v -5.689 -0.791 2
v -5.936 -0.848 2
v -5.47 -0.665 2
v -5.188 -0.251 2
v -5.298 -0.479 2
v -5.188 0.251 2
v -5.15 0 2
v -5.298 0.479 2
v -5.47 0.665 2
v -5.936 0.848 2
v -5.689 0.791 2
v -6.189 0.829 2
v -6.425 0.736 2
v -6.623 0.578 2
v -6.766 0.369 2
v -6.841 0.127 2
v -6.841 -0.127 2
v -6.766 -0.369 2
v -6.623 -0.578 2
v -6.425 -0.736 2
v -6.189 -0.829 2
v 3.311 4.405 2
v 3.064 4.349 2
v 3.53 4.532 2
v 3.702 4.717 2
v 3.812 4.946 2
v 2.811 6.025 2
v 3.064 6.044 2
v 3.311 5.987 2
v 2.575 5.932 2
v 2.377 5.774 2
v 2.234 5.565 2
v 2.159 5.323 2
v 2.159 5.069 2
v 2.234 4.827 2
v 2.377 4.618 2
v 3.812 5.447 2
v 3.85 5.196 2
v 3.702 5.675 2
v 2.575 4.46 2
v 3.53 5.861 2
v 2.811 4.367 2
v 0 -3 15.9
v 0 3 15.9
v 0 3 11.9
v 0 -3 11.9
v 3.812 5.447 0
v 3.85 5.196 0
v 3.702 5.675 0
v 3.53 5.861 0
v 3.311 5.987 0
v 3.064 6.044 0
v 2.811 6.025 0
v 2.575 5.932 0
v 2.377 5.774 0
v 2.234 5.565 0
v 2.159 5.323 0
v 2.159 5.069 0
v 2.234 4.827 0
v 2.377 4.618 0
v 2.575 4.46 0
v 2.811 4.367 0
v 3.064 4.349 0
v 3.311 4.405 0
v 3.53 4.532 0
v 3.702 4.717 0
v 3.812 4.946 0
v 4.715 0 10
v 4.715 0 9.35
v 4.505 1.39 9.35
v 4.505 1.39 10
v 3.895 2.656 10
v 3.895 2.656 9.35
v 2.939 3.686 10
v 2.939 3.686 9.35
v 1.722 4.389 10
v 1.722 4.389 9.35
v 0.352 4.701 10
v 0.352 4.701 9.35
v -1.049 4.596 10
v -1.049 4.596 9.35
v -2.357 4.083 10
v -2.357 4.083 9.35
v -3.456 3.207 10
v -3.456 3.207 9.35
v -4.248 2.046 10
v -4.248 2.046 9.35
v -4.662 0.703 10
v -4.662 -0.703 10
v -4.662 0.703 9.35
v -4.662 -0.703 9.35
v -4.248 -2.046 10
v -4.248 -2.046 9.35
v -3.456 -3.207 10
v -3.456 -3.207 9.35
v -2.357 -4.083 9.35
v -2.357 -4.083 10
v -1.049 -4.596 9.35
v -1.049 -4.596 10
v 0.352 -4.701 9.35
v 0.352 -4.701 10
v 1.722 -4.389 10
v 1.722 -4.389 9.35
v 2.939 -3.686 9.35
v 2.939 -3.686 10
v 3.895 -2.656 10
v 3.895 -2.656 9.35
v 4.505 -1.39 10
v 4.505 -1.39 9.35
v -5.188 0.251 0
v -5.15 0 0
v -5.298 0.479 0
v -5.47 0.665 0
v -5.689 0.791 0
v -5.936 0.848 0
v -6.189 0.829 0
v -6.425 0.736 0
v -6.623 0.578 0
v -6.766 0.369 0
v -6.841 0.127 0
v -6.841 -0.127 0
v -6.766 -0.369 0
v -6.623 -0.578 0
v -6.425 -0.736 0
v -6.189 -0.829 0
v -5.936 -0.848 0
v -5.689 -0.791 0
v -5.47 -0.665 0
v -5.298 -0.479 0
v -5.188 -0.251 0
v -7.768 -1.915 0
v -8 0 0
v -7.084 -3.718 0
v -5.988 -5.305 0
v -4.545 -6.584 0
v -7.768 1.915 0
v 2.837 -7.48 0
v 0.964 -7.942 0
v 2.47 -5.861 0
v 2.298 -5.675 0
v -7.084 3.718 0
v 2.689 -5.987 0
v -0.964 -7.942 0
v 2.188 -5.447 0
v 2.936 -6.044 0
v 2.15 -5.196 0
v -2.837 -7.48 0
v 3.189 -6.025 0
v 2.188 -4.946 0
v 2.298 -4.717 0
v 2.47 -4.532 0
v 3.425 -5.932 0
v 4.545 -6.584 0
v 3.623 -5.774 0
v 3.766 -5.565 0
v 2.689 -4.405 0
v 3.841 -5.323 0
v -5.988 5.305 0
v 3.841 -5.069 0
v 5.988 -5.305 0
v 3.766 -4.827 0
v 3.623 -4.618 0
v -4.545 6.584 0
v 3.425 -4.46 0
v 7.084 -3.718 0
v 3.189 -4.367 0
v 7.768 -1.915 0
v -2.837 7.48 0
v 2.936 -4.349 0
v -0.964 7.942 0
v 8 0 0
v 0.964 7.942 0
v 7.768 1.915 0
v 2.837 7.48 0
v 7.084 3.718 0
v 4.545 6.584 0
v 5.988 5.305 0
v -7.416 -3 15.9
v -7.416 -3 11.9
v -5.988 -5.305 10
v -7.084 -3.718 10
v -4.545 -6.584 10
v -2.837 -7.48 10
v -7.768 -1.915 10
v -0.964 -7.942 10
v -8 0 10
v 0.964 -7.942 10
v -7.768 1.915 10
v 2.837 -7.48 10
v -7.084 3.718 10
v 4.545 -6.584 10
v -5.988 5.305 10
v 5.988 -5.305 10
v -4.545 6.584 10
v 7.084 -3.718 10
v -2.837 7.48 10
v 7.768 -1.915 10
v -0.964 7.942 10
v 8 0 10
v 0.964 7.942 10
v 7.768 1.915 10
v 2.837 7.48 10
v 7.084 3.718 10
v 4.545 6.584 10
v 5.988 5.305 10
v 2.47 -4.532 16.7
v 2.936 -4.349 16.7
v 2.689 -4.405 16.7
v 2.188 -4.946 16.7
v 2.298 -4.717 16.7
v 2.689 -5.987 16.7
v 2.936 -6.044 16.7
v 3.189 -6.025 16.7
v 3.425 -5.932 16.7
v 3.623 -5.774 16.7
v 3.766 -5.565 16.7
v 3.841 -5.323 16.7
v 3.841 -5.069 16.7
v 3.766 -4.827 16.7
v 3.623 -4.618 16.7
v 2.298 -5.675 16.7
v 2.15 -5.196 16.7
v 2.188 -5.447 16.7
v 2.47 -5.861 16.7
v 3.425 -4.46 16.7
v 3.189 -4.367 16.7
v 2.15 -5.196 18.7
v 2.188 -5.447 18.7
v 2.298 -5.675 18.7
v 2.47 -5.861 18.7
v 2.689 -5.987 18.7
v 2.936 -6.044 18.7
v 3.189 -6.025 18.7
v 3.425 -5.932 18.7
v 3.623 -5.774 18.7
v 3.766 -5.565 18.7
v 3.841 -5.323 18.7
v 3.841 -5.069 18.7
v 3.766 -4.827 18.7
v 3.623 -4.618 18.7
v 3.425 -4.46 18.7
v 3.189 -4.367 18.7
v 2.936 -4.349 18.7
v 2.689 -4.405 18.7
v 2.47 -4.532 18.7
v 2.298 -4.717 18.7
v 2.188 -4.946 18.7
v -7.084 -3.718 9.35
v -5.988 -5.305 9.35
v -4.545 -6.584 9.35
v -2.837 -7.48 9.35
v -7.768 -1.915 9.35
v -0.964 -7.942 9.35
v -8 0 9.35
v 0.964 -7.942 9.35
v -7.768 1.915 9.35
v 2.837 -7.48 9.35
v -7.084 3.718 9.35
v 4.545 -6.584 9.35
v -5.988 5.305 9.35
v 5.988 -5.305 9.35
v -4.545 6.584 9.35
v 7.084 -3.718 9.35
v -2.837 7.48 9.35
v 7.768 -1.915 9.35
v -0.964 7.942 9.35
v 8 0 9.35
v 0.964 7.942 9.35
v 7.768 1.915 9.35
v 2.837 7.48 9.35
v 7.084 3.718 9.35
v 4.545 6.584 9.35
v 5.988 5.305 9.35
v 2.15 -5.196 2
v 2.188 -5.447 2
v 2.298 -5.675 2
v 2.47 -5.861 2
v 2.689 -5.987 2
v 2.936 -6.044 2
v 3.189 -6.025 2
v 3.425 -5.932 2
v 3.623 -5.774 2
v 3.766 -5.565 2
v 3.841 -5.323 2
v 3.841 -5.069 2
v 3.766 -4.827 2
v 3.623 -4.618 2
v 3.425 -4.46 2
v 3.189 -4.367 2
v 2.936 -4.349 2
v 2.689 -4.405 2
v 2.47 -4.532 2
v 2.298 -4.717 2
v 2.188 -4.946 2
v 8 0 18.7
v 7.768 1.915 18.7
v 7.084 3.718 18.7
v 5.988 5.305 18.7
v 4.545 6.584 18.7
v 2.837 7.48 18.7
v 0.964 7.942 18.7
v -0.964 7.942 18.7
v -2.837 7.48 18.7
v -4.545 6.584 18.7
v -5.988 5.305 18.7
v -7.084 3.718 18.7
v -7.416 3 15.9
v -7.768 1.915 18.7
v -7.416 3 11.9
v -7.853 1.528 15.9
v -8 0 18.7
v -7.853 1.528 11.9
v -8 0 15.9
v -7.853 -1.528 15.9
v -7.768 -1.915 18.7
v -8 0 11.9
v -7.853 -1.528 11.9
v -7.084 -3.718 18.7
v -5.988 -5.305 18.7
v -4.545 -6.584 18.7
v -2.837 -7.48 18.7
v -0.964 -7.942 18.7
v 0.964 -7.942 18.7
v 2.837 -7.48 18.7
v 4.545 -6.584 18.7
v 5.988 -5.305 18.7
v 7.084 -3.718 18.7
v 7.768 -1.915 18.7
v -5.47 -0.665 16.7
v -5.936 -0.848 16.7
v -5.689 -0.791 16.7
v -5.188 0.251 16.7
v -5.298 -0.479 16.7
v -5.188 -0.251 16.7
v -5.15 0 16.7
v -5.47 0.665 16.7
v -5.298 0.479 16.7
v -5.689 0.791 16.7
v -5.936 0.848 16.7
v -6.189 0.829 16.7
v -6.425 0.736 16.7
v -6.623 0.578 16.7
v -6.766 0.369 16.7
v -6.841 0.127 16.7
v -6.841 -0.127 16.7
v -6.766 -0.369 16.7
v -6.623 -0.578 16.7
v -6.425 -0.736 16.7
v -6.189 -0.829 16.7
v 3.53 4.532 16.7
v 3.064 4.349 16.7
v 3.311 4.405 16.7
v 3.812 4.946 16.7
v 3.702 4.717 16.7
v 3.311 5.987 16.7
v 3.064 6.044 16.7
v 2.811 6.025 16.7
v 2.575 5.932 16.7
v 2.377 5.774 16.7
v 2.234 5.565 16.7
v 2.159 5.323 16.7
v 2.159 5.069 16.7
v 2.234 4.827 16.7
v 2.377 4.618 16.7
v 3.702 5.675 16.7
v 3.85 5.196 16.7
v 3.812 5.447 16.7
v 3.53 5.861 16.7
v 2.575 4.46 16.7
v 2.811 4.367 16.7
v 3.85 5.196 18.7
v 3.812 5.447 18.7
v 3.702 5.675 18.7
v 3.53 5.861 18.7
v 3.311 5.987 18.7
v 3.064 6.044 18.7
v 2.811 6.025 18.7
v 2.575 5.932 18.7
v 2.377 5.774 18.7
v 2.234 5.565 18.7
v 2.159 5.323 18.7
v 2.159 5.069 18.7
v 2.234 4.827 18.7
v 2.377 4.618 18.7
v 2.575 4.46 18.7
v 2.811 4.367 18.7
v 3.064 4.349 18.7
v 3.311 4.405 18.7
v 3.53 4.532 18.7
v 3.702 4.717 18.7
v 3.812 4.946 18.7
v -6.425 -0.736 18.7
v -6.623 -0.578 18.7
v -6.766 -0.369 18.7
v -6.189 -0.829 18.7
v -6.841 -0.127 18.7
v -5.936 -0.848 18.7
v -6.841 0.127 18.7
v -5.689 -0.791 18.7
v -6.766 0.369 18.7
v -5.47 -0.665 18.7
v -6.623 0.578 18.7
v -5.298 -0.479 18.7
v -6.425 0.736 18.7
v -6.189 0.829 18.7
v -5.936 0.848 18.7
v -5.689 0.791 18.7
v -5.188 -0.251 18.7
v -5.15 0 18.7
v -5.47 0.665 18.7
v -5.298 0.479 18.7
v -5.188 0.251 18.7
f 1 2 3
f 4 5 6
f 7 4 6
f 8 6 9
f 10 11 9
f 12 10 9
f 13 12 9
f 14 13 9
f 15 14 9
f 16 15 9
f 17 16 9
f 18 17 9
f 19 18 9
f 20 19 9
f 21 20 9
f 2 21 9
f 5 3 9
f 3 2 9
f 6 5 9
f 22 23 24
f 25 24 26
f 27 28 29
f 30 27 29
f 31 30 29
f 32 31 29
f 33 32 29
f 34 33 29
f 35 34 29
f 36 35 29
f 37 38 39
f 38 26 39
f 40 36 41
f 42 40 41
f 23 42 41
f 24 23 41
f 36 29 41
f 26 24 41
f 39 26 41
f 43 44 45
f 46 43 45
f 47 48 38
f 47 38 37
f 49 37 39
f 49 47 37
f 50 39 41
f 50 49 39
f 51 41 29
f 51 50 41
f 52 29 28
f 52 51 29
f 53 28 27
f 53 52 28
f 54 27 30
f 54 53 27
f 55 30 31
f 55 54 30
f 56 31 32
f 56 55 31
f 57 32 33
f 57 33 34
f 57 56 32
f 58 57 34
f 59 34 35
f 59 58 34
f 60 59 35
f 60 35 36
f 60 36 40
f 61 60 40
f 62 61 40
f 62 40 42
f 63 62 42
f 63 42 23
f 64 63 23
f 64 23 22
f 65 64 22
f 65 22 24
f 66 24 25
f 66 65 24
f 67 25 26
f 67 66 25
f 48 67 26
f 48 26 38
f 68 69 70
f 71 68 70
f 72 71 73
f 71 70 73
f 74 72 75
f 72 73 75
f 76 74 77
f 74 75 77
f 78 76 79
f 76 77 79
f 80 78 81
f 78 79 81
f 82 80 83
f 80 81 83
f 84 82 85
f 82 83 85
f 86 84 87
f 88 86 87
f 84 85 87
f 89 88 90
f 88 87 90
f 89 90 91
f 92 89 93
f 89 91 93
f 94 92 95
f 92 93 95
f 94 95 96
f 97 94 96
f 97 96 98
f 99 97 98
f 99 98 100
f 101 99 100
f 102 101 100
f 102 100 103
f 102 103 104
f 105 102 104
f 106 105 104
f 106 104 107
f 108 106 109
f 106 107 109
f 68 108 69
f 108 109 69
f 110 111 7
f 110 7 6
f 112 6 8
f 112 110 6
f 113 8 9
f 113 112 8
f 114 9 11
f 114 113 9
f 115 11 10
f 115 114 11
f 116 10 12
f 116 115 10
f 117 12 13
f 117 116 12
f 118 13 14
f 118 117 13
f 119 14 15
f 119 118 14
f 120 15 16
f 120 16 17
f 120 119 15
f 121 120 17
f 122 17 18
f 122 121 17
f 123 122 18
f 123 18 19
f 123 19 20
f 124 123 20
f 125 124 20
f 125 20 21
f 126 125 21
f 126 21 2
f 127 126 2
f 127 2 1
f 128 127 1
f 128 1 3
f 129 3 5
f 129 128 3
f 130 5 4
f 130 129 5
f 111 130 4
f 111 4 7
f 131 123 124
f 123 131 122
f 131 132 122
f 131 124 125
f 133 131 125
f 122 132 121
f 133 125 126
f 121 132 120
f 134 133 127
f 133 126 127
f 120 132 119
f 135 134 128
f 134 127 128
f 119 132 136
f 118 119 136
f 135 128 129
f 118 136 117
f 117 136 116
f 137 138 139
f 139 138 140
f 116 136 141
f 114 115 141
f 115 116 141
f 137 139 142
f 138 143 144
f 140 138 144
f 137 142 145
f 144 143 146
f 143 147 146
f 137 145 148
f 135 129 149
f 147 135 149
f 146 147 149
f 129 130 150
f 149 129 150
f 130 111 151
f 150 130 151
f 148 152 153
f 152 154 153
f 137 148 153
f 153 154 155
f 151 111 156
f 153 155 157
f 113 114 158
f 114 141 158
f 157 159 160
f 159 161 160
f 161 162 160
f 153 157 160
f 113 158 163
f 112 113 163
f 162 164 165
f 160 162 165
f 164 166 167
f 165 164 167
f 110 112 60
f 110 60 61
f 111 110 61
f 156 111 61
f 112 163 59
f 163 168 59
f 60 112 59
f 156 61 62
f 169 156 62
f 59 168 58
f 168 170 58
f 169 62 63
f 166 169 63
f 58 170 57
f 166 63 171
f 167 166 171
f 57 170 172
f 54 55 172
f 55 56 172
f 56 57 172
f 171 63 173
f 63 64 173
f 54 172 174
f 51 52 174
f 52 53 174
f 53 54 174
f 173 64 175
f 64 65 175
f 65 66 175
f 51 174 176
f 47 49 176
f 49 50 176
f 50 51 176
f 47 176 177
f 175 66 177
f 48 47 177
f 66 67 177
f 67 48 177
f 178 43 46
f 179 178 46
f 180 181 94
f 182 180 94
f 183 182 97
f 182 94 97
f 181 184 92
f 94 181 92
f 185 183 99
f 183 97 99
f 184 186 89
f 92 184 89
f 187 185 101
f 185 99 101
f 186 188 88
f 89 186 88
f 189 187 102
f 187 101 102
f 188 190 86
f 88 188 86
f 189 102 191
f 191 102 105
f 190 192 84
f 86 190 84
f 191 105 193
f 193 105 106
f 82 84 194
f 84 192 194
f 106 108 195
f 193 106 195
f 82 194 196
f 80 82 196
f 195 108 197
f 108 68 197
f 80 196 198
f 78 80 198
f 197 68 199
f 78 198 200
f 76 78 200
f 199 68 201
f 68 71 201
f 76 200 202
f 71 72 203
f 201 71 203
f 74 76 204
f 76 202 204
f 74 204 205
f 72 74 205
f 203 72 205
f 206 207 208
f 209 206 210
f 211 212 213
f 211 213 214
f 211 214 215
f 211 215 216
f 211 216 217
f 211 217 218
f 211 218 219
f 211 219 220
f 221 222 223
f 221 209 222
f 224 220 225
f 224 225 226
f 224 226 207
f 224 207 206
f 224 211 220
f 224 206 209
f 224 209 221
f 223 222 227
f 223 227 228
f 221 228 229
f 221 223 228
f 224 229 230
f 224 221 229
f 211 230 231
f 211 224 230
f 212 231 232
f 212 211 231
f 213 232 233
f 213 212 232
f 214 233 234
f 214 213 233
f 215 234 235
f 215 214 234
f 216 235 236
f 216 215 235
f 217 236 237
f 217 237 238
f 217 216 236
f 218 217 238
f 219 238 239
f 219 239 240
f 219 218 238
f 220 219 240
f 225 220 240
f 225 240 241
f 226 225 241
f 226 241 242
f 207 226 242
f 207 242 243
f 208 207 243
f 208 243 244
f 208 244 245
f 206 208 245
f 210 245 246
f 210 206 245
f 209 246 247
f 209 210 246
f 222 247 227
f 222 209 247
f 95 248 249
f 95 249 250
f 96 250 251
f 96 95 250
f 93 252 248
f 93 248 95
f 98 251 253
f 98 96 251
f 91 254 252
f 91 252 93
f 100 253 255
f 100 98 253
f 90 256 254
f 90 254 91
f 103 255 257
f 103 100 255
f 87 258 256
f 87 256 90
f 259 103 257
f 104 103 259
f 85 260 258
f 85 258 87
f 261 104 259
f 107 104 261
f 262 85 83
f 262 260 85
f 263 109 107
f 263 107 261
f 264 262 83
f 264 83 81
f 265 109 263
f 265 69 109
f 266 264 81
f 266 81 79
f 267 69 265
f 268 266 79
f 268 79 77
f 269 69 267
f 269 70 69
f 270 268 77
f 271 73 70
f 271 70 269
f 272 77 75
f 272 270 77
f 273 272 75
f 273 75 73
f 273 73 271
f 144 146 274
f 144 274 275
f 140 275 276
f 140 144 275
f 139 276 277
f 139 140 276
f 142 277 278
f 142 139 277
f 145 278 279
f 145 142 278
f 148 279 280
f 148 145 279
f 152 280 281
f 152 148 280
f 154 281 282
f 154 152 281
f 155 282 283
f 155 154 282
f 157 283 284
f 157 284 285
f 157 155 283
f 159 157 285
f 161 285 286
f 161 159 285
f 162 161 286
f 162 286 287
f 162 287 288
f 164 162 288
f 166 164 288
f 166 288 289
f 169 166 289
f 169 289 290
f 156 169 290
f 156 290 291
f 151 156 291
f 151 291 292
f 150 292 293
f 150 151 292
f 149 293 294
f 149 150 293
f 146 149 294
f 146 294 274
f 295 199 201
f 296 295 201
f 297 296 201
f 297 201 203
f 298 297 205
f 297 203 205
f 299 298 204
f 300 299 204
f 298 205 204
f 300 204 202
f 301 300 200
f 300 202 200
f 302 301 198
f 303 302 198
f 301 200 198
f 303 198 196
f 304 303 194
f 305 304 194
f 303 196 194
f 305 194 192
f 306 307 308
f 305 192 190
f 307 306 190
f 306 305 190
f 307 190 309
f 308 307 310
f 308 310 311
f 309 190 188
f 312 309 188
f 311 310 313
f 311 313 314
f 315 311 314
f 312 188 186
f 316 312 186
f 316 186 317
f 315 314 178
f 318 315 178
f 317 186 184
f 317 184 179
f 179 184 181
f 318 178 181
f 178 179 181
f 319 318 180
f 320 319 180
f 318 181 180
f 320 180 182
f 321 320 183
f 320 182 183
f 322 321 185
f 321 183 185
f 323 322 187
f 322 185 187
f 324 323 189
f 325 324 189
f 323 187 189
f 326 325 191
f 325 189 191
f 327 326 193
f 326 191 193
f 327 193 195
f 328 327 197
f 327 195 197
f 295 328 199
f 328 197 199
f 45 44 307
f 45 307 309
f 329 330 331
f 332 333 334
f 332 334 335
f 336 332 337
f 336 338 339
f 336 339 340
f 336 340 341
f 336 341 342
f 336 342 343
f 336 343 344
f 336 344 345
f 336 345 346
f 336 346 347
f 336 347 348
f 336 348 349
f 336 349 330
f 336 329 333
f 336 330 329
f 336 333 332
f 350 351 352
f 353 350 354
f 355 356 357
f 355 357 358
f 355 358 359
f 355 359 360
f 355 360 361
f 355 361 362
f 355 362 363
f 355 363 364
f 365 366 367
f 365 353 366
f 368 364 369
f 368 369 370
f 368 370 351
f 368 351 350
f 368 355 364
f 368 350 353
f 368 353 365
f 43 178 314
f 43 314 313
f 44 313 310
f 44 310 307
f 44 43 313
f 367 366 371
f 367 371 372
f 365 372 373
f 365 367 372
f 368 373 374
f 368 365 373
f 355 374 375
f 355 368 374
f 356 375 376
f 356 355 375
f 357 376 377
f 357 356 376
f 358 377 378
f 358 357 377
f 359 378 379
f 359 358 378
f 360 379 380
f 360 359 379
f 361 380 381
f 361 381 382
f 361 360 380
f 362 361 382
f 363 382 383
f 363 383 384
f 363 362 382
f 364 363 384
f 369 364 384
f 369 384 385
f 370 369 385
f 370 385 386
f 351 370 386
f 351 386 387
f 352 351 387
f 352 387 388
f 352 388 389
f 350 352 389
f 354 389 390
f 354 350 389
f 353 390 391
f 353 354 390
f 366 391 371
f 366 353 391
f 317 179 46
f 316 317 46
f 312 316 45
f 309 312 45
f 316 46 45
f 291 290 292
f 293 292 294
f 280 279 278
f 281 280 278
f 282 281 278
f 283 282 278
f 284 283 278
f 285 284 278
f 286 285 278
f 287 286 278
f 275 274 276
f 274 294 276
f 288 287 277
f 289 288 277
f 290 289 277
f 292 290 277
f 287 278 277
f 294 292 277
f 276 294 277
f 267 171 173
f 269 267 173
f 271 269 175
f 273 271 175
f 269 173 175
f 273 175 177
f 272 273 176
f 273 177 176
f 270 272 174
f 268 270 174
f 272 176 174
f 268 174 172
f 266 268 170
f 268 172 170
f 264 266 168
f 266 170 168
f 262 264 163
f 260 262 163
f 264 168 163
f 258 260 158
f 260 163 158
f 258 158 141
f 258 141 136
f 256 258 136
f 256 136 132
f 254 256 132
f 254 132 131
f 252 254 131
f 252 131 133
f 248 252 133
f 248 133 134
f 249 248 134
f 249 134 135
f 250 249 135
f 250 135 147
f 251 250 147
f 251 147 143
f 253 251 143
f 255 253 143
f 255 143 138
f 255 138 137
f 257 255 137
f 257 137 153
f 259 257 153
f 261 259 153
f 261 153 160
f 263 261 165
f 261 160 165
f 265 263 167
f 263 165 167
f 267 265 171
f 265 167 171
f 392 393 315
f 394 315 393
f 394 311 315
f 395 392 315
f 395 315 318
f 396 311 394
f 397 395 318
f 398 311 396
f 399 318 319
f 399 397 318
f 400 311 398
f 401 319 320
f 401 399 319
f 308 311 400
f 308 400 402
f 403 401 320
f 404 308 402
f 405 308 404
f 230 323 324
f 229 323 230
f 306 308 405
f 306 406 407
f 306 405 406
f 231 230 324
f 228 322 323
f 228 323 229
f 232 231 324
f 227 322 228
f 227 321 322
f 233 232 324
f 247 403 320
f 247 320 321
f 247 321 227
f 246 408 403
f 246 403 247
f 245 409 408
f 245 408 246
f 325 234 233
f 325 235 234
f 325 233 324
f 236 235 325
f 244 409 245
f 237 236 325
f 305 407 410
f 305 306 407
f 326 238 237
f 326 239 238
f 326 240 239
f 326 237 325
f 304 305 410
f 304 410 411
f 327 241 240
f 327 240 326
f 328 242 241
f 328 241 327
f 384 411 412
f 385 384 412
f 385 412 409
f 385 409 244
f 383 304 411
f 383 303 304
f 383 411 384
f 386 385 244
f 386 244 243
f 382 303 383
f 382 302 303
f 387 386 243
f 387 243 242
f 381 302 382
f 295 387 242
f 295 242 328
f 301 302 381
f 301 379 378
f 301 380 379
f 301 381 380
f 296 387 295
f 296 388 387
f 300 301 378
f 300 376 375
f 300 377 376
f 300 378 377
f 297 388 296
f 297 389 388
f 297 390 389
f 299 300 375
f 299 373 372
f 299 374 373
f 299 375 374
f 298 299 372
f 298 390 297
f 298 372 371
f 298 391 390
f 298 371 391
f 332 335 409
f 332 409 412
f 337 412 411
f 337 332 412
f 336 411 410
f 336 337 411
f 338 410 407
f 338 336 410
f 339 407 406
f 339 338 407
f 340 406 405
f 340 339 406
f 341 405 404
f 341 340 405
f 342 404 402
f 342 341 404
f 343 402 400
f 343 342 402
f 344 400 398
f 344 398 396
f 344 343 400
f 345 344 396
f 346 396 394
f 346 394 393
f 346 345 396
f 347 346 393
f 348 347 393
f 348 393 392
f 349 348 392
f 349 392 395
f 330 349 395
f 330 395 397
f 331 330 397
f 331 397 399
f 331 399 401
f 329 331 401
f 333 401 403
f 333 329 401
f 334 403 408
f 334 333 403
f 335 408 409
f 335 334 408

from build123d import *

# Parameters (mm, degrees)
SKETCH_1_R          = 8
EXTRUDE_1_DEPTH     = 18.7
SKETCH_2_W          = 4
SKETCH_2_H          = 6
CUT_EXTRUDE_1_DEPTH = 18.7
OTHER_START         = 9.35
OTHER_4_OUTLINE_R   = 8
OTHER_4_OUTLINE_R_2 = 4.714576893
OTHER_4_DEPTH       = 0.65
SKETCH_1_3_R        = 0.85
CUT_EXTRUDE_2_DEPTH = 2
CUT_EXTRUDE_START   = 16.7
SKETCH_1_4_R        = 0.85
CUT_EXTRUDE_3_DEPTH = 2
SKETCH_1_6_R        = 0.85
CUT_EXTRUDE_4_DEPTH = 2
SKETCH_1_7_R        = 0.85
CUT_EXTRUDE_5_DEPTH = 2


# Read off the part's stored shape, not the designer's step: 切除-旋转-薄壁4
with BuildPart() as part:
    # 草图1 → 凸台-拉伸1 (new body)
    with BuildSketch(Plane.XY):
        Circle(SKETCH_1_R)
    extrude(amount=EXTRUDE_1_DEPTH)

    # 草图2 → 切除-拉伸1 (cut)
    with BuildSketch(Plane(origin=(0, 0, 0), x_dir=(0, 0, -1), z_dir=(1, 0, 0))):
        with Locations((-13.9, 0)):
            Rectangle(SKETCH_2_W, SKETCH_2_H)
    extrude(amount=-CUT_EXTRUDE_1_DEPTH, mode=Mode.SUBTRACT)

    # 切除-旋转-薄壁4 outline → 切除-旋转-薄壁4 (cut)
    with BuildSketch(Plane.XY.offset(OTHER_START)):
        Circle(OTHER_4_OUTLINE_R)
        Circle(OTHER_4_OUTLINE_R_2, mode=Mode.SUBTRACT)
    extrude(amount=OTHER_4_DEPTH, mode=Mode.SUBTRACT)

    # 草图1<3> → 切除-拉伸2 (cut)
    with BuildSketch(Plane.XY):
        with Locations((-6, 0)):
            Circle(SKETCH_1_3_R)
        with Locations((3, 5.196152423)):
            Circle(SKETCH_1_3_R)
    extrude(amount=CUT_EXTRUDE_2_DEPTH, mode=Mode.SUBTRACT)

    # 草图1<4> → 切除-拉伸3 (cut)
    with BuildSketch(Plane.XY.offset(CUT_EXTRUDE_START)):
        with Locations((-6, 0)):
            Circle(SKETCH_1_4_R)
        with Locations((3, 5.196152423)):
            Circle(SKETCH_1_4_R)
    extrude(amount=CUT_EXTRUDE_3_DEPTH, mode=Mode.SUBTRACT)

    # 草图1<6> → 切除-拉伸4 (cut)
    with BuildSketch(Plane.XY):
        with Locations(Location((3, -5.196152423, 0), (0, 0, 180))):
            Circle(SKETCH_1_6_R)
    extrude(amount=CUT_EXTRUDE_4_DEPTH, mode=Mode.SUBTRACT)

    # 草图1<7> → 切除-拉伸5 (cut)
    with BuildSketch(Plane.XY.offset(CUT_EXTRUDE_START)):
        with Locations(Location((3, -5.196152423, 0), (0, 0, 180))):
            Circle(SKETCH_1_7_R)
    extrude(amount=CUT_EXTRUDE_5_DEPTH, mode=Mode.SUBTRACT)


solid = part.part
